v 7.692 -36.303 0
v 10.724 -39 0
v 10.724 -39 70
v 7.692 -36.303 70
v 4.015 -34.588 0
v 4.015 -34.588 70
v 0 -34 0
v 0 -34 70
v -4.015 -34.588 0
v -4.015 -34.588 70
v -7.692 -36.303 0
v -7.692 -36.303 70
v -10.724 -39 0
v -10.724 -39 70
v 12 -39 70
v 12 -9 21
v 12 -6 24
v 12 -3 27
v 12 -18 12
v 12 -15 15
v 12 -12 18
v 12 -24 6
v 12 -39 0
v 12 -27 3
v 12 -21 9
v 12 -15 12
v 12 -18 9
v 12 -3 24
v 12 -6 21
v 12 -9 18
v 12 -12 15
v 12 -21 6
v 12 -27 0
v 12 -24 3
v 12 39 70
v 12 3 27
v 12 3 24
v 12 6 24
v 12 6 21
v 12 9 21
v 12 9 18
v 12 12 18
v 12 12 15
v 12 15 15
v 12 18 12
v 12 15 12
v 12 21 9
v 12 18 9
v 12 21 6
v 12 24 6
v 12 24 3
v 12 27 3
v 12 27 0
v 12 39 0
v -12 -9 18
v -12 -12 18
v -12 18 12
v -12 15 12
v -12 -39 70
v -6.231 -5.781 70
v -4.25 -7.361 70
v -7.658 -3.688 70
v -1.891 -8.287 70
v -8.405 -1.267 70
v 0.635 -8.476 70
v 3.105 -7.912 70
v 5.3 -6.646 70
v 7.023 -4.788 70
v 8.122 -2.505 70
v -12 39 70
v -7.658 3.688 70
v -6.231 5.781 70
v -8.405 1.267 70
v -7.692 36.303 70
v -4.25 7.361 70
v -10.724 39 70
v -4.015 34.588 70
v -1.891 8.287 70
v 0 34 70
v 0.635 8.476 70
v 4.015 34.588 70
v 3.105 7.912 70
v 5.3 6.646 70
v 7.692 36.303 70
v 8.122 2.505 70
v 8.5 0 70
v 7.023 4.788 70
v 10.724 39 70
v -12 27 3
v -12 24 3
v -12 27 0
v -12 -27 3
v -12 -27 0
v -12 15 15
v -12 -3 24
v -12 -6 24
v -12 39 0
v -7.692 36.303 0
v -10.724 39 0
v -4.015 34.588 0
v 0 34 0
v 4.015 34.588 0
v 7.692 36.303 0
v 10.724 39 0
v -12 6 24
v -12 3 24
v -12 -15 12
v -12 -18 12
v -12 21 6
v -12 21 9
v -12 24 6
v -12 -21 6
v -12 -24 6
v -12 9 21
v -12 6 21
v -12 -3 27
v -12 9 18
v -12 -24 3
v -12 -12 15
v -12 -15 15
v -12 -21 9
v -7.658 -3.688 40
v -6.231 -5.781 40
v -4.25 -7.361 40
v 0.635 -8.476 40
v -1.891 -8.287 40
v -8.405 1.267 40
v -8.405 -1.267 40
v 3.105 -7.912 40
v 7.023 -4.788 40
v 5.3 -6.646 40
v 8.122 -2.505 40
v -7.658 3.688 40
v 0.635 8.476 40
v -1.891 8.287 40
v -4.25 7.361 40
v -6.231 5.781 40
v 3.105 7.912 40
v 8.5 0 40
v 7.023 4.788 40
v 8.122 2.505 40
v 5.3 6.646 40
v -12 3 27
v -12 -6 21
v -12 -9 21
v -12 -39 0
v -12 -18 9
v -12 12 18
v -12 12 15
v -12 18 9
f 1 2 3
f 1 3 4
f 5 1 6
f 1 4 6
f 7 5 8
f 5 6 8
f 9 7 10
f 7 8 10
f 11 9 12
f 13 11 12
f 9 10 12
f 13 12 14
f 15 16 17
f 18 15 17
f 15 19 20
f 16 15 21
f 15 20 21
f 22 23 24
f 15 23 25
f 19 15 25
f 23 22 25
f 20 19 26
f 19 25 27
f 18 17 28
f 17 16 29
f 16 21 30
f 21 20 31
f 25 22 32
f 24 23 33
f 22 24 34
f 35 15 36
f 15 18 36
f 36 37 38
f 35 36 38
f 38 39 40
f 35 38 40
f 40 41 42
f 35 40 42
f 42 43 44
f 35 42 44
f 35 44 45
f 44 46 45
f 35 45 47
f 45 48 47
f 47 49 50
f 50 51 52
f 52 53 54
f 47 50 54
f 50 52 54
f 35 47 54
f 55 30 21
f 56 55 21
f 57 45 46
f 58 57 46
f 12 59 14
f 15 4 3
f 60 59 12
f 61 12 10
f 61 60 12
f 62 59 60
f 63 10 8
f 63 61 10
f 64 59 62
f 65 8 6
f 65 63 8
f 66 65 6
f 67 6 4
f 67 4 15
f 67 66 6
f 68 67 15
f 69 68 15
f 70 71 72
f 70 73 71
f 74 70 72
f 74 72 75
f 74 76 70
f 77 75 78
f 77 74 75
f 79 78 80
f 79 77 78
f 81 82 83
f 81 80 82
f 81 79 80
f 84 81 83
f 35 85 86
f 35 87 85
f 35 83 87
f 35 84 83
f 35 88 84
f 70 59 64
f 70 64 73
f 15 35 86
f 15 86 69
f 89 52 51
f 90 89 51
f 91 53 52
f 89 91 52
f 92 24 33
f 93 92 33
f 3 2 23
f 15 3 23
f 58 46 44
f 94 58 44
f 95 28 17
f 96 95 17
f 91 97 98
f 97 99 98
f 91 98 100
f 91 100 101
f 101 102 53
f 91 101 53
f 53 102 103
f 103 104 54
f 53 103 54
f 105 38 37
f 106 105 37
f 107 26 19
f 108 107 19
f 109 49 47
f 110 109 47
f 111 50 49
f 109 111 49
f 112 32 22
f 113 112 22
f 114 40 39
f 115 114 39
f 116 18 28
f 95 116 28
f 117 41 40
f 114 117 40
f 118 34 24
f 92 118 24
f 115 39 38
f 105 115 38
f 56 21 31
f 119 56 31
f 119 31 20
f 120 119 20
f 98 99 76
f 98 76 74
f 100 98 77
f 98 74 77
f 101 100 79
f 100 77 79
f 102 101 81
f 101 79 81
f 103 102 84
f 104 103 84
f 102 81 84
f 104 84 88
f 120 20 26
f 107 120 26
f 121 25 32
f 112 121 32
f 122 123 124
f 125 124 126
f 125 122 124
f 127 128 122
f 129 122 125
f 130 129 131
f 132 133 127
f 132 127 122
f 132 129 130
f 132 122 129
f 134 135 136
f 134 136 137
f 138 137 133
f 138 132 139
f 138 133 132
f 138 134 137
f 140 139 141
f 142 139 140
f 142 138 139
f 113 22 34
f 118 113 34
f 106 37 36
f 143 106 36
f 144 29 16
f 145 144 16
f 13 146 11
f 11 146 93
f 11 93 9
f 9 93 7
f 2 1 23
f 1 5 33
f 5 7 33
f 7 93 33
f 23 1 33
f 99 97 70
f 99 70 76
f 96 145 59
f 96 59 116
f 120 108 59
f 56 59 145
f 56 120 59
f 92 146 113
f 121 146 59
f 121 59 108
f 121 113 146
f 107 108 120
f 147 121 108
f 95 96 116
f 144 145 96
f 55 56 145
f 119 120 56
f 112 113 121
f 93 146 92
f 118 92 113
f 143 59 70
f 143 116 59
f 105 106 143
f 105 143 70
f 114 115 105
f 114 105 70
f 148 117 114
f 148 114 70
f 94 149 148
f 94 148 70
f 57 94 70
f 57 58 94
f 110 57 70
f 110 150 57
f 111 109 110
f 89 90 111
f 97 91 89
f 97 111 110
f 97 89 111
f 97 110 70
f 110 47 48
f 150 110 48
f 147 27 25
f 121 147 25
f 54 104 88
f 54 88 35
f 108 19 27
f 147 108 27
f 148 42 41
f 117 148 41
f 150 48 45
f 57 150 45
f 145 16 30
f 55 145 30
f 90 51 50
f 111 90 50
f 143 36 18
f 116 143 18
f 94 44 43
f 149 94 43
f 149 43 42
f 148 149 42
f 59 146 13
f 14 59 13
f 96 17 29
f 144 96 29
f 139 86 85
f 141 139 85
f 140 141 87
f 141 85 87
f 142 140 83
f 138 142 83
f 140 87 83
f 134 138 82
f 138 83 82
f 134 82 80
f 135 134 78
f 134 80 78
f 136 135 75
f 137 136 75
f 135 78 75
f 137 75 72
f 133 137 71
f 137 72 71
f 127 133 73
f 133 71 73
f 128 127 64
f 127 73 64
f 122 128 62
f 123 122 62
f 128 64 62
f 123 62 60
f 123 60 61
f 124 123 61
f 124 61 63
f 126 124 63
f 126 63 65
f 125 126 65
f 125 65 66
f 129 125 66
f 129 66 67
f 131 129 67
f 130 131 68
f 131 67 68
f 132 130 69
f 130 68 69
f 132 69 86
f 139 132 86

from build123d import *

# Parameters (mm, degrees)
SKETCH_W        = 24
SKETCH_H        = 78
PAD_DEPTH       = 70
SKETCH001_R     = 8.5
POCKET_DEPTH    = 30
POCKET001_DEPTH = 70
POCKET002_DEPTH = 24


with BuildPart() as part:
    # Sketch → Pad (new body)
    with BuildSketch(Plane.XY):
        Rectangle(SKETCH_W, SKETCH_H)
    extrude(amount=PAD_DEPTH)

    # Sketch001 (on Face6 of Pad) → Pocket (cut)
    with BuildSketch(Plane.XY.offset(70)):
        Circle(SKETCH001_R)
    extrude(amount=-POCKET_DEPTH, mode=Mode.SUBTRACT)

    # Sketch002 (on Face5 of Pocket) → Pocket001 (cut)
    with BuildSketch(Plane.XY.offset(70)):
        with BuildLine():
            ThreePointArc((-10.723805, 39), (0, 34), (10.723805, 39))
            Line((-10.723805, 39), (10.723805, 39))
        make_face()
        with BuildLine():
            ThreePointArc((10.723805, -39), (0, -34), (-10.723805, -39))
            Line((-10.723805, -39), (10.723805, -39))
        make_face()
    extrude(amount=-POCKET001_DEPTH, mode=Mode.SUBTRACT)

    # Sketch003 (on Face9 of Pocket001) → Pocket002 (cut)
    with BuildSketch(Plane.YZ.offset(12)):
        Polygon((-27, 3), (-27, 0), (27, 0), (27, 3), (24, 3), (24, 6), (21, 6), (21, 9), (18, 9), (18, 12), (15, 12), (15, 15), (12, 15), (12, 18), (9, 18), (9, 21), (6, 21), (6, 24), (3, 24), (3, 27), (-3, 27), (-3, 24), (-6, 24), (-6, 21), (-9, 21), (-9, 18), (-12, 18), (-12, 15), (-15, 15), (-15, 12), (-18, 12), (-18, 9), (-21, 9), (-21, 6), (-24, 6), (-24, 3), align=None)
    extrude(amount=-POCKET002_DEPTH, mode=Mode.SUBTRACT)


solid = part.part
